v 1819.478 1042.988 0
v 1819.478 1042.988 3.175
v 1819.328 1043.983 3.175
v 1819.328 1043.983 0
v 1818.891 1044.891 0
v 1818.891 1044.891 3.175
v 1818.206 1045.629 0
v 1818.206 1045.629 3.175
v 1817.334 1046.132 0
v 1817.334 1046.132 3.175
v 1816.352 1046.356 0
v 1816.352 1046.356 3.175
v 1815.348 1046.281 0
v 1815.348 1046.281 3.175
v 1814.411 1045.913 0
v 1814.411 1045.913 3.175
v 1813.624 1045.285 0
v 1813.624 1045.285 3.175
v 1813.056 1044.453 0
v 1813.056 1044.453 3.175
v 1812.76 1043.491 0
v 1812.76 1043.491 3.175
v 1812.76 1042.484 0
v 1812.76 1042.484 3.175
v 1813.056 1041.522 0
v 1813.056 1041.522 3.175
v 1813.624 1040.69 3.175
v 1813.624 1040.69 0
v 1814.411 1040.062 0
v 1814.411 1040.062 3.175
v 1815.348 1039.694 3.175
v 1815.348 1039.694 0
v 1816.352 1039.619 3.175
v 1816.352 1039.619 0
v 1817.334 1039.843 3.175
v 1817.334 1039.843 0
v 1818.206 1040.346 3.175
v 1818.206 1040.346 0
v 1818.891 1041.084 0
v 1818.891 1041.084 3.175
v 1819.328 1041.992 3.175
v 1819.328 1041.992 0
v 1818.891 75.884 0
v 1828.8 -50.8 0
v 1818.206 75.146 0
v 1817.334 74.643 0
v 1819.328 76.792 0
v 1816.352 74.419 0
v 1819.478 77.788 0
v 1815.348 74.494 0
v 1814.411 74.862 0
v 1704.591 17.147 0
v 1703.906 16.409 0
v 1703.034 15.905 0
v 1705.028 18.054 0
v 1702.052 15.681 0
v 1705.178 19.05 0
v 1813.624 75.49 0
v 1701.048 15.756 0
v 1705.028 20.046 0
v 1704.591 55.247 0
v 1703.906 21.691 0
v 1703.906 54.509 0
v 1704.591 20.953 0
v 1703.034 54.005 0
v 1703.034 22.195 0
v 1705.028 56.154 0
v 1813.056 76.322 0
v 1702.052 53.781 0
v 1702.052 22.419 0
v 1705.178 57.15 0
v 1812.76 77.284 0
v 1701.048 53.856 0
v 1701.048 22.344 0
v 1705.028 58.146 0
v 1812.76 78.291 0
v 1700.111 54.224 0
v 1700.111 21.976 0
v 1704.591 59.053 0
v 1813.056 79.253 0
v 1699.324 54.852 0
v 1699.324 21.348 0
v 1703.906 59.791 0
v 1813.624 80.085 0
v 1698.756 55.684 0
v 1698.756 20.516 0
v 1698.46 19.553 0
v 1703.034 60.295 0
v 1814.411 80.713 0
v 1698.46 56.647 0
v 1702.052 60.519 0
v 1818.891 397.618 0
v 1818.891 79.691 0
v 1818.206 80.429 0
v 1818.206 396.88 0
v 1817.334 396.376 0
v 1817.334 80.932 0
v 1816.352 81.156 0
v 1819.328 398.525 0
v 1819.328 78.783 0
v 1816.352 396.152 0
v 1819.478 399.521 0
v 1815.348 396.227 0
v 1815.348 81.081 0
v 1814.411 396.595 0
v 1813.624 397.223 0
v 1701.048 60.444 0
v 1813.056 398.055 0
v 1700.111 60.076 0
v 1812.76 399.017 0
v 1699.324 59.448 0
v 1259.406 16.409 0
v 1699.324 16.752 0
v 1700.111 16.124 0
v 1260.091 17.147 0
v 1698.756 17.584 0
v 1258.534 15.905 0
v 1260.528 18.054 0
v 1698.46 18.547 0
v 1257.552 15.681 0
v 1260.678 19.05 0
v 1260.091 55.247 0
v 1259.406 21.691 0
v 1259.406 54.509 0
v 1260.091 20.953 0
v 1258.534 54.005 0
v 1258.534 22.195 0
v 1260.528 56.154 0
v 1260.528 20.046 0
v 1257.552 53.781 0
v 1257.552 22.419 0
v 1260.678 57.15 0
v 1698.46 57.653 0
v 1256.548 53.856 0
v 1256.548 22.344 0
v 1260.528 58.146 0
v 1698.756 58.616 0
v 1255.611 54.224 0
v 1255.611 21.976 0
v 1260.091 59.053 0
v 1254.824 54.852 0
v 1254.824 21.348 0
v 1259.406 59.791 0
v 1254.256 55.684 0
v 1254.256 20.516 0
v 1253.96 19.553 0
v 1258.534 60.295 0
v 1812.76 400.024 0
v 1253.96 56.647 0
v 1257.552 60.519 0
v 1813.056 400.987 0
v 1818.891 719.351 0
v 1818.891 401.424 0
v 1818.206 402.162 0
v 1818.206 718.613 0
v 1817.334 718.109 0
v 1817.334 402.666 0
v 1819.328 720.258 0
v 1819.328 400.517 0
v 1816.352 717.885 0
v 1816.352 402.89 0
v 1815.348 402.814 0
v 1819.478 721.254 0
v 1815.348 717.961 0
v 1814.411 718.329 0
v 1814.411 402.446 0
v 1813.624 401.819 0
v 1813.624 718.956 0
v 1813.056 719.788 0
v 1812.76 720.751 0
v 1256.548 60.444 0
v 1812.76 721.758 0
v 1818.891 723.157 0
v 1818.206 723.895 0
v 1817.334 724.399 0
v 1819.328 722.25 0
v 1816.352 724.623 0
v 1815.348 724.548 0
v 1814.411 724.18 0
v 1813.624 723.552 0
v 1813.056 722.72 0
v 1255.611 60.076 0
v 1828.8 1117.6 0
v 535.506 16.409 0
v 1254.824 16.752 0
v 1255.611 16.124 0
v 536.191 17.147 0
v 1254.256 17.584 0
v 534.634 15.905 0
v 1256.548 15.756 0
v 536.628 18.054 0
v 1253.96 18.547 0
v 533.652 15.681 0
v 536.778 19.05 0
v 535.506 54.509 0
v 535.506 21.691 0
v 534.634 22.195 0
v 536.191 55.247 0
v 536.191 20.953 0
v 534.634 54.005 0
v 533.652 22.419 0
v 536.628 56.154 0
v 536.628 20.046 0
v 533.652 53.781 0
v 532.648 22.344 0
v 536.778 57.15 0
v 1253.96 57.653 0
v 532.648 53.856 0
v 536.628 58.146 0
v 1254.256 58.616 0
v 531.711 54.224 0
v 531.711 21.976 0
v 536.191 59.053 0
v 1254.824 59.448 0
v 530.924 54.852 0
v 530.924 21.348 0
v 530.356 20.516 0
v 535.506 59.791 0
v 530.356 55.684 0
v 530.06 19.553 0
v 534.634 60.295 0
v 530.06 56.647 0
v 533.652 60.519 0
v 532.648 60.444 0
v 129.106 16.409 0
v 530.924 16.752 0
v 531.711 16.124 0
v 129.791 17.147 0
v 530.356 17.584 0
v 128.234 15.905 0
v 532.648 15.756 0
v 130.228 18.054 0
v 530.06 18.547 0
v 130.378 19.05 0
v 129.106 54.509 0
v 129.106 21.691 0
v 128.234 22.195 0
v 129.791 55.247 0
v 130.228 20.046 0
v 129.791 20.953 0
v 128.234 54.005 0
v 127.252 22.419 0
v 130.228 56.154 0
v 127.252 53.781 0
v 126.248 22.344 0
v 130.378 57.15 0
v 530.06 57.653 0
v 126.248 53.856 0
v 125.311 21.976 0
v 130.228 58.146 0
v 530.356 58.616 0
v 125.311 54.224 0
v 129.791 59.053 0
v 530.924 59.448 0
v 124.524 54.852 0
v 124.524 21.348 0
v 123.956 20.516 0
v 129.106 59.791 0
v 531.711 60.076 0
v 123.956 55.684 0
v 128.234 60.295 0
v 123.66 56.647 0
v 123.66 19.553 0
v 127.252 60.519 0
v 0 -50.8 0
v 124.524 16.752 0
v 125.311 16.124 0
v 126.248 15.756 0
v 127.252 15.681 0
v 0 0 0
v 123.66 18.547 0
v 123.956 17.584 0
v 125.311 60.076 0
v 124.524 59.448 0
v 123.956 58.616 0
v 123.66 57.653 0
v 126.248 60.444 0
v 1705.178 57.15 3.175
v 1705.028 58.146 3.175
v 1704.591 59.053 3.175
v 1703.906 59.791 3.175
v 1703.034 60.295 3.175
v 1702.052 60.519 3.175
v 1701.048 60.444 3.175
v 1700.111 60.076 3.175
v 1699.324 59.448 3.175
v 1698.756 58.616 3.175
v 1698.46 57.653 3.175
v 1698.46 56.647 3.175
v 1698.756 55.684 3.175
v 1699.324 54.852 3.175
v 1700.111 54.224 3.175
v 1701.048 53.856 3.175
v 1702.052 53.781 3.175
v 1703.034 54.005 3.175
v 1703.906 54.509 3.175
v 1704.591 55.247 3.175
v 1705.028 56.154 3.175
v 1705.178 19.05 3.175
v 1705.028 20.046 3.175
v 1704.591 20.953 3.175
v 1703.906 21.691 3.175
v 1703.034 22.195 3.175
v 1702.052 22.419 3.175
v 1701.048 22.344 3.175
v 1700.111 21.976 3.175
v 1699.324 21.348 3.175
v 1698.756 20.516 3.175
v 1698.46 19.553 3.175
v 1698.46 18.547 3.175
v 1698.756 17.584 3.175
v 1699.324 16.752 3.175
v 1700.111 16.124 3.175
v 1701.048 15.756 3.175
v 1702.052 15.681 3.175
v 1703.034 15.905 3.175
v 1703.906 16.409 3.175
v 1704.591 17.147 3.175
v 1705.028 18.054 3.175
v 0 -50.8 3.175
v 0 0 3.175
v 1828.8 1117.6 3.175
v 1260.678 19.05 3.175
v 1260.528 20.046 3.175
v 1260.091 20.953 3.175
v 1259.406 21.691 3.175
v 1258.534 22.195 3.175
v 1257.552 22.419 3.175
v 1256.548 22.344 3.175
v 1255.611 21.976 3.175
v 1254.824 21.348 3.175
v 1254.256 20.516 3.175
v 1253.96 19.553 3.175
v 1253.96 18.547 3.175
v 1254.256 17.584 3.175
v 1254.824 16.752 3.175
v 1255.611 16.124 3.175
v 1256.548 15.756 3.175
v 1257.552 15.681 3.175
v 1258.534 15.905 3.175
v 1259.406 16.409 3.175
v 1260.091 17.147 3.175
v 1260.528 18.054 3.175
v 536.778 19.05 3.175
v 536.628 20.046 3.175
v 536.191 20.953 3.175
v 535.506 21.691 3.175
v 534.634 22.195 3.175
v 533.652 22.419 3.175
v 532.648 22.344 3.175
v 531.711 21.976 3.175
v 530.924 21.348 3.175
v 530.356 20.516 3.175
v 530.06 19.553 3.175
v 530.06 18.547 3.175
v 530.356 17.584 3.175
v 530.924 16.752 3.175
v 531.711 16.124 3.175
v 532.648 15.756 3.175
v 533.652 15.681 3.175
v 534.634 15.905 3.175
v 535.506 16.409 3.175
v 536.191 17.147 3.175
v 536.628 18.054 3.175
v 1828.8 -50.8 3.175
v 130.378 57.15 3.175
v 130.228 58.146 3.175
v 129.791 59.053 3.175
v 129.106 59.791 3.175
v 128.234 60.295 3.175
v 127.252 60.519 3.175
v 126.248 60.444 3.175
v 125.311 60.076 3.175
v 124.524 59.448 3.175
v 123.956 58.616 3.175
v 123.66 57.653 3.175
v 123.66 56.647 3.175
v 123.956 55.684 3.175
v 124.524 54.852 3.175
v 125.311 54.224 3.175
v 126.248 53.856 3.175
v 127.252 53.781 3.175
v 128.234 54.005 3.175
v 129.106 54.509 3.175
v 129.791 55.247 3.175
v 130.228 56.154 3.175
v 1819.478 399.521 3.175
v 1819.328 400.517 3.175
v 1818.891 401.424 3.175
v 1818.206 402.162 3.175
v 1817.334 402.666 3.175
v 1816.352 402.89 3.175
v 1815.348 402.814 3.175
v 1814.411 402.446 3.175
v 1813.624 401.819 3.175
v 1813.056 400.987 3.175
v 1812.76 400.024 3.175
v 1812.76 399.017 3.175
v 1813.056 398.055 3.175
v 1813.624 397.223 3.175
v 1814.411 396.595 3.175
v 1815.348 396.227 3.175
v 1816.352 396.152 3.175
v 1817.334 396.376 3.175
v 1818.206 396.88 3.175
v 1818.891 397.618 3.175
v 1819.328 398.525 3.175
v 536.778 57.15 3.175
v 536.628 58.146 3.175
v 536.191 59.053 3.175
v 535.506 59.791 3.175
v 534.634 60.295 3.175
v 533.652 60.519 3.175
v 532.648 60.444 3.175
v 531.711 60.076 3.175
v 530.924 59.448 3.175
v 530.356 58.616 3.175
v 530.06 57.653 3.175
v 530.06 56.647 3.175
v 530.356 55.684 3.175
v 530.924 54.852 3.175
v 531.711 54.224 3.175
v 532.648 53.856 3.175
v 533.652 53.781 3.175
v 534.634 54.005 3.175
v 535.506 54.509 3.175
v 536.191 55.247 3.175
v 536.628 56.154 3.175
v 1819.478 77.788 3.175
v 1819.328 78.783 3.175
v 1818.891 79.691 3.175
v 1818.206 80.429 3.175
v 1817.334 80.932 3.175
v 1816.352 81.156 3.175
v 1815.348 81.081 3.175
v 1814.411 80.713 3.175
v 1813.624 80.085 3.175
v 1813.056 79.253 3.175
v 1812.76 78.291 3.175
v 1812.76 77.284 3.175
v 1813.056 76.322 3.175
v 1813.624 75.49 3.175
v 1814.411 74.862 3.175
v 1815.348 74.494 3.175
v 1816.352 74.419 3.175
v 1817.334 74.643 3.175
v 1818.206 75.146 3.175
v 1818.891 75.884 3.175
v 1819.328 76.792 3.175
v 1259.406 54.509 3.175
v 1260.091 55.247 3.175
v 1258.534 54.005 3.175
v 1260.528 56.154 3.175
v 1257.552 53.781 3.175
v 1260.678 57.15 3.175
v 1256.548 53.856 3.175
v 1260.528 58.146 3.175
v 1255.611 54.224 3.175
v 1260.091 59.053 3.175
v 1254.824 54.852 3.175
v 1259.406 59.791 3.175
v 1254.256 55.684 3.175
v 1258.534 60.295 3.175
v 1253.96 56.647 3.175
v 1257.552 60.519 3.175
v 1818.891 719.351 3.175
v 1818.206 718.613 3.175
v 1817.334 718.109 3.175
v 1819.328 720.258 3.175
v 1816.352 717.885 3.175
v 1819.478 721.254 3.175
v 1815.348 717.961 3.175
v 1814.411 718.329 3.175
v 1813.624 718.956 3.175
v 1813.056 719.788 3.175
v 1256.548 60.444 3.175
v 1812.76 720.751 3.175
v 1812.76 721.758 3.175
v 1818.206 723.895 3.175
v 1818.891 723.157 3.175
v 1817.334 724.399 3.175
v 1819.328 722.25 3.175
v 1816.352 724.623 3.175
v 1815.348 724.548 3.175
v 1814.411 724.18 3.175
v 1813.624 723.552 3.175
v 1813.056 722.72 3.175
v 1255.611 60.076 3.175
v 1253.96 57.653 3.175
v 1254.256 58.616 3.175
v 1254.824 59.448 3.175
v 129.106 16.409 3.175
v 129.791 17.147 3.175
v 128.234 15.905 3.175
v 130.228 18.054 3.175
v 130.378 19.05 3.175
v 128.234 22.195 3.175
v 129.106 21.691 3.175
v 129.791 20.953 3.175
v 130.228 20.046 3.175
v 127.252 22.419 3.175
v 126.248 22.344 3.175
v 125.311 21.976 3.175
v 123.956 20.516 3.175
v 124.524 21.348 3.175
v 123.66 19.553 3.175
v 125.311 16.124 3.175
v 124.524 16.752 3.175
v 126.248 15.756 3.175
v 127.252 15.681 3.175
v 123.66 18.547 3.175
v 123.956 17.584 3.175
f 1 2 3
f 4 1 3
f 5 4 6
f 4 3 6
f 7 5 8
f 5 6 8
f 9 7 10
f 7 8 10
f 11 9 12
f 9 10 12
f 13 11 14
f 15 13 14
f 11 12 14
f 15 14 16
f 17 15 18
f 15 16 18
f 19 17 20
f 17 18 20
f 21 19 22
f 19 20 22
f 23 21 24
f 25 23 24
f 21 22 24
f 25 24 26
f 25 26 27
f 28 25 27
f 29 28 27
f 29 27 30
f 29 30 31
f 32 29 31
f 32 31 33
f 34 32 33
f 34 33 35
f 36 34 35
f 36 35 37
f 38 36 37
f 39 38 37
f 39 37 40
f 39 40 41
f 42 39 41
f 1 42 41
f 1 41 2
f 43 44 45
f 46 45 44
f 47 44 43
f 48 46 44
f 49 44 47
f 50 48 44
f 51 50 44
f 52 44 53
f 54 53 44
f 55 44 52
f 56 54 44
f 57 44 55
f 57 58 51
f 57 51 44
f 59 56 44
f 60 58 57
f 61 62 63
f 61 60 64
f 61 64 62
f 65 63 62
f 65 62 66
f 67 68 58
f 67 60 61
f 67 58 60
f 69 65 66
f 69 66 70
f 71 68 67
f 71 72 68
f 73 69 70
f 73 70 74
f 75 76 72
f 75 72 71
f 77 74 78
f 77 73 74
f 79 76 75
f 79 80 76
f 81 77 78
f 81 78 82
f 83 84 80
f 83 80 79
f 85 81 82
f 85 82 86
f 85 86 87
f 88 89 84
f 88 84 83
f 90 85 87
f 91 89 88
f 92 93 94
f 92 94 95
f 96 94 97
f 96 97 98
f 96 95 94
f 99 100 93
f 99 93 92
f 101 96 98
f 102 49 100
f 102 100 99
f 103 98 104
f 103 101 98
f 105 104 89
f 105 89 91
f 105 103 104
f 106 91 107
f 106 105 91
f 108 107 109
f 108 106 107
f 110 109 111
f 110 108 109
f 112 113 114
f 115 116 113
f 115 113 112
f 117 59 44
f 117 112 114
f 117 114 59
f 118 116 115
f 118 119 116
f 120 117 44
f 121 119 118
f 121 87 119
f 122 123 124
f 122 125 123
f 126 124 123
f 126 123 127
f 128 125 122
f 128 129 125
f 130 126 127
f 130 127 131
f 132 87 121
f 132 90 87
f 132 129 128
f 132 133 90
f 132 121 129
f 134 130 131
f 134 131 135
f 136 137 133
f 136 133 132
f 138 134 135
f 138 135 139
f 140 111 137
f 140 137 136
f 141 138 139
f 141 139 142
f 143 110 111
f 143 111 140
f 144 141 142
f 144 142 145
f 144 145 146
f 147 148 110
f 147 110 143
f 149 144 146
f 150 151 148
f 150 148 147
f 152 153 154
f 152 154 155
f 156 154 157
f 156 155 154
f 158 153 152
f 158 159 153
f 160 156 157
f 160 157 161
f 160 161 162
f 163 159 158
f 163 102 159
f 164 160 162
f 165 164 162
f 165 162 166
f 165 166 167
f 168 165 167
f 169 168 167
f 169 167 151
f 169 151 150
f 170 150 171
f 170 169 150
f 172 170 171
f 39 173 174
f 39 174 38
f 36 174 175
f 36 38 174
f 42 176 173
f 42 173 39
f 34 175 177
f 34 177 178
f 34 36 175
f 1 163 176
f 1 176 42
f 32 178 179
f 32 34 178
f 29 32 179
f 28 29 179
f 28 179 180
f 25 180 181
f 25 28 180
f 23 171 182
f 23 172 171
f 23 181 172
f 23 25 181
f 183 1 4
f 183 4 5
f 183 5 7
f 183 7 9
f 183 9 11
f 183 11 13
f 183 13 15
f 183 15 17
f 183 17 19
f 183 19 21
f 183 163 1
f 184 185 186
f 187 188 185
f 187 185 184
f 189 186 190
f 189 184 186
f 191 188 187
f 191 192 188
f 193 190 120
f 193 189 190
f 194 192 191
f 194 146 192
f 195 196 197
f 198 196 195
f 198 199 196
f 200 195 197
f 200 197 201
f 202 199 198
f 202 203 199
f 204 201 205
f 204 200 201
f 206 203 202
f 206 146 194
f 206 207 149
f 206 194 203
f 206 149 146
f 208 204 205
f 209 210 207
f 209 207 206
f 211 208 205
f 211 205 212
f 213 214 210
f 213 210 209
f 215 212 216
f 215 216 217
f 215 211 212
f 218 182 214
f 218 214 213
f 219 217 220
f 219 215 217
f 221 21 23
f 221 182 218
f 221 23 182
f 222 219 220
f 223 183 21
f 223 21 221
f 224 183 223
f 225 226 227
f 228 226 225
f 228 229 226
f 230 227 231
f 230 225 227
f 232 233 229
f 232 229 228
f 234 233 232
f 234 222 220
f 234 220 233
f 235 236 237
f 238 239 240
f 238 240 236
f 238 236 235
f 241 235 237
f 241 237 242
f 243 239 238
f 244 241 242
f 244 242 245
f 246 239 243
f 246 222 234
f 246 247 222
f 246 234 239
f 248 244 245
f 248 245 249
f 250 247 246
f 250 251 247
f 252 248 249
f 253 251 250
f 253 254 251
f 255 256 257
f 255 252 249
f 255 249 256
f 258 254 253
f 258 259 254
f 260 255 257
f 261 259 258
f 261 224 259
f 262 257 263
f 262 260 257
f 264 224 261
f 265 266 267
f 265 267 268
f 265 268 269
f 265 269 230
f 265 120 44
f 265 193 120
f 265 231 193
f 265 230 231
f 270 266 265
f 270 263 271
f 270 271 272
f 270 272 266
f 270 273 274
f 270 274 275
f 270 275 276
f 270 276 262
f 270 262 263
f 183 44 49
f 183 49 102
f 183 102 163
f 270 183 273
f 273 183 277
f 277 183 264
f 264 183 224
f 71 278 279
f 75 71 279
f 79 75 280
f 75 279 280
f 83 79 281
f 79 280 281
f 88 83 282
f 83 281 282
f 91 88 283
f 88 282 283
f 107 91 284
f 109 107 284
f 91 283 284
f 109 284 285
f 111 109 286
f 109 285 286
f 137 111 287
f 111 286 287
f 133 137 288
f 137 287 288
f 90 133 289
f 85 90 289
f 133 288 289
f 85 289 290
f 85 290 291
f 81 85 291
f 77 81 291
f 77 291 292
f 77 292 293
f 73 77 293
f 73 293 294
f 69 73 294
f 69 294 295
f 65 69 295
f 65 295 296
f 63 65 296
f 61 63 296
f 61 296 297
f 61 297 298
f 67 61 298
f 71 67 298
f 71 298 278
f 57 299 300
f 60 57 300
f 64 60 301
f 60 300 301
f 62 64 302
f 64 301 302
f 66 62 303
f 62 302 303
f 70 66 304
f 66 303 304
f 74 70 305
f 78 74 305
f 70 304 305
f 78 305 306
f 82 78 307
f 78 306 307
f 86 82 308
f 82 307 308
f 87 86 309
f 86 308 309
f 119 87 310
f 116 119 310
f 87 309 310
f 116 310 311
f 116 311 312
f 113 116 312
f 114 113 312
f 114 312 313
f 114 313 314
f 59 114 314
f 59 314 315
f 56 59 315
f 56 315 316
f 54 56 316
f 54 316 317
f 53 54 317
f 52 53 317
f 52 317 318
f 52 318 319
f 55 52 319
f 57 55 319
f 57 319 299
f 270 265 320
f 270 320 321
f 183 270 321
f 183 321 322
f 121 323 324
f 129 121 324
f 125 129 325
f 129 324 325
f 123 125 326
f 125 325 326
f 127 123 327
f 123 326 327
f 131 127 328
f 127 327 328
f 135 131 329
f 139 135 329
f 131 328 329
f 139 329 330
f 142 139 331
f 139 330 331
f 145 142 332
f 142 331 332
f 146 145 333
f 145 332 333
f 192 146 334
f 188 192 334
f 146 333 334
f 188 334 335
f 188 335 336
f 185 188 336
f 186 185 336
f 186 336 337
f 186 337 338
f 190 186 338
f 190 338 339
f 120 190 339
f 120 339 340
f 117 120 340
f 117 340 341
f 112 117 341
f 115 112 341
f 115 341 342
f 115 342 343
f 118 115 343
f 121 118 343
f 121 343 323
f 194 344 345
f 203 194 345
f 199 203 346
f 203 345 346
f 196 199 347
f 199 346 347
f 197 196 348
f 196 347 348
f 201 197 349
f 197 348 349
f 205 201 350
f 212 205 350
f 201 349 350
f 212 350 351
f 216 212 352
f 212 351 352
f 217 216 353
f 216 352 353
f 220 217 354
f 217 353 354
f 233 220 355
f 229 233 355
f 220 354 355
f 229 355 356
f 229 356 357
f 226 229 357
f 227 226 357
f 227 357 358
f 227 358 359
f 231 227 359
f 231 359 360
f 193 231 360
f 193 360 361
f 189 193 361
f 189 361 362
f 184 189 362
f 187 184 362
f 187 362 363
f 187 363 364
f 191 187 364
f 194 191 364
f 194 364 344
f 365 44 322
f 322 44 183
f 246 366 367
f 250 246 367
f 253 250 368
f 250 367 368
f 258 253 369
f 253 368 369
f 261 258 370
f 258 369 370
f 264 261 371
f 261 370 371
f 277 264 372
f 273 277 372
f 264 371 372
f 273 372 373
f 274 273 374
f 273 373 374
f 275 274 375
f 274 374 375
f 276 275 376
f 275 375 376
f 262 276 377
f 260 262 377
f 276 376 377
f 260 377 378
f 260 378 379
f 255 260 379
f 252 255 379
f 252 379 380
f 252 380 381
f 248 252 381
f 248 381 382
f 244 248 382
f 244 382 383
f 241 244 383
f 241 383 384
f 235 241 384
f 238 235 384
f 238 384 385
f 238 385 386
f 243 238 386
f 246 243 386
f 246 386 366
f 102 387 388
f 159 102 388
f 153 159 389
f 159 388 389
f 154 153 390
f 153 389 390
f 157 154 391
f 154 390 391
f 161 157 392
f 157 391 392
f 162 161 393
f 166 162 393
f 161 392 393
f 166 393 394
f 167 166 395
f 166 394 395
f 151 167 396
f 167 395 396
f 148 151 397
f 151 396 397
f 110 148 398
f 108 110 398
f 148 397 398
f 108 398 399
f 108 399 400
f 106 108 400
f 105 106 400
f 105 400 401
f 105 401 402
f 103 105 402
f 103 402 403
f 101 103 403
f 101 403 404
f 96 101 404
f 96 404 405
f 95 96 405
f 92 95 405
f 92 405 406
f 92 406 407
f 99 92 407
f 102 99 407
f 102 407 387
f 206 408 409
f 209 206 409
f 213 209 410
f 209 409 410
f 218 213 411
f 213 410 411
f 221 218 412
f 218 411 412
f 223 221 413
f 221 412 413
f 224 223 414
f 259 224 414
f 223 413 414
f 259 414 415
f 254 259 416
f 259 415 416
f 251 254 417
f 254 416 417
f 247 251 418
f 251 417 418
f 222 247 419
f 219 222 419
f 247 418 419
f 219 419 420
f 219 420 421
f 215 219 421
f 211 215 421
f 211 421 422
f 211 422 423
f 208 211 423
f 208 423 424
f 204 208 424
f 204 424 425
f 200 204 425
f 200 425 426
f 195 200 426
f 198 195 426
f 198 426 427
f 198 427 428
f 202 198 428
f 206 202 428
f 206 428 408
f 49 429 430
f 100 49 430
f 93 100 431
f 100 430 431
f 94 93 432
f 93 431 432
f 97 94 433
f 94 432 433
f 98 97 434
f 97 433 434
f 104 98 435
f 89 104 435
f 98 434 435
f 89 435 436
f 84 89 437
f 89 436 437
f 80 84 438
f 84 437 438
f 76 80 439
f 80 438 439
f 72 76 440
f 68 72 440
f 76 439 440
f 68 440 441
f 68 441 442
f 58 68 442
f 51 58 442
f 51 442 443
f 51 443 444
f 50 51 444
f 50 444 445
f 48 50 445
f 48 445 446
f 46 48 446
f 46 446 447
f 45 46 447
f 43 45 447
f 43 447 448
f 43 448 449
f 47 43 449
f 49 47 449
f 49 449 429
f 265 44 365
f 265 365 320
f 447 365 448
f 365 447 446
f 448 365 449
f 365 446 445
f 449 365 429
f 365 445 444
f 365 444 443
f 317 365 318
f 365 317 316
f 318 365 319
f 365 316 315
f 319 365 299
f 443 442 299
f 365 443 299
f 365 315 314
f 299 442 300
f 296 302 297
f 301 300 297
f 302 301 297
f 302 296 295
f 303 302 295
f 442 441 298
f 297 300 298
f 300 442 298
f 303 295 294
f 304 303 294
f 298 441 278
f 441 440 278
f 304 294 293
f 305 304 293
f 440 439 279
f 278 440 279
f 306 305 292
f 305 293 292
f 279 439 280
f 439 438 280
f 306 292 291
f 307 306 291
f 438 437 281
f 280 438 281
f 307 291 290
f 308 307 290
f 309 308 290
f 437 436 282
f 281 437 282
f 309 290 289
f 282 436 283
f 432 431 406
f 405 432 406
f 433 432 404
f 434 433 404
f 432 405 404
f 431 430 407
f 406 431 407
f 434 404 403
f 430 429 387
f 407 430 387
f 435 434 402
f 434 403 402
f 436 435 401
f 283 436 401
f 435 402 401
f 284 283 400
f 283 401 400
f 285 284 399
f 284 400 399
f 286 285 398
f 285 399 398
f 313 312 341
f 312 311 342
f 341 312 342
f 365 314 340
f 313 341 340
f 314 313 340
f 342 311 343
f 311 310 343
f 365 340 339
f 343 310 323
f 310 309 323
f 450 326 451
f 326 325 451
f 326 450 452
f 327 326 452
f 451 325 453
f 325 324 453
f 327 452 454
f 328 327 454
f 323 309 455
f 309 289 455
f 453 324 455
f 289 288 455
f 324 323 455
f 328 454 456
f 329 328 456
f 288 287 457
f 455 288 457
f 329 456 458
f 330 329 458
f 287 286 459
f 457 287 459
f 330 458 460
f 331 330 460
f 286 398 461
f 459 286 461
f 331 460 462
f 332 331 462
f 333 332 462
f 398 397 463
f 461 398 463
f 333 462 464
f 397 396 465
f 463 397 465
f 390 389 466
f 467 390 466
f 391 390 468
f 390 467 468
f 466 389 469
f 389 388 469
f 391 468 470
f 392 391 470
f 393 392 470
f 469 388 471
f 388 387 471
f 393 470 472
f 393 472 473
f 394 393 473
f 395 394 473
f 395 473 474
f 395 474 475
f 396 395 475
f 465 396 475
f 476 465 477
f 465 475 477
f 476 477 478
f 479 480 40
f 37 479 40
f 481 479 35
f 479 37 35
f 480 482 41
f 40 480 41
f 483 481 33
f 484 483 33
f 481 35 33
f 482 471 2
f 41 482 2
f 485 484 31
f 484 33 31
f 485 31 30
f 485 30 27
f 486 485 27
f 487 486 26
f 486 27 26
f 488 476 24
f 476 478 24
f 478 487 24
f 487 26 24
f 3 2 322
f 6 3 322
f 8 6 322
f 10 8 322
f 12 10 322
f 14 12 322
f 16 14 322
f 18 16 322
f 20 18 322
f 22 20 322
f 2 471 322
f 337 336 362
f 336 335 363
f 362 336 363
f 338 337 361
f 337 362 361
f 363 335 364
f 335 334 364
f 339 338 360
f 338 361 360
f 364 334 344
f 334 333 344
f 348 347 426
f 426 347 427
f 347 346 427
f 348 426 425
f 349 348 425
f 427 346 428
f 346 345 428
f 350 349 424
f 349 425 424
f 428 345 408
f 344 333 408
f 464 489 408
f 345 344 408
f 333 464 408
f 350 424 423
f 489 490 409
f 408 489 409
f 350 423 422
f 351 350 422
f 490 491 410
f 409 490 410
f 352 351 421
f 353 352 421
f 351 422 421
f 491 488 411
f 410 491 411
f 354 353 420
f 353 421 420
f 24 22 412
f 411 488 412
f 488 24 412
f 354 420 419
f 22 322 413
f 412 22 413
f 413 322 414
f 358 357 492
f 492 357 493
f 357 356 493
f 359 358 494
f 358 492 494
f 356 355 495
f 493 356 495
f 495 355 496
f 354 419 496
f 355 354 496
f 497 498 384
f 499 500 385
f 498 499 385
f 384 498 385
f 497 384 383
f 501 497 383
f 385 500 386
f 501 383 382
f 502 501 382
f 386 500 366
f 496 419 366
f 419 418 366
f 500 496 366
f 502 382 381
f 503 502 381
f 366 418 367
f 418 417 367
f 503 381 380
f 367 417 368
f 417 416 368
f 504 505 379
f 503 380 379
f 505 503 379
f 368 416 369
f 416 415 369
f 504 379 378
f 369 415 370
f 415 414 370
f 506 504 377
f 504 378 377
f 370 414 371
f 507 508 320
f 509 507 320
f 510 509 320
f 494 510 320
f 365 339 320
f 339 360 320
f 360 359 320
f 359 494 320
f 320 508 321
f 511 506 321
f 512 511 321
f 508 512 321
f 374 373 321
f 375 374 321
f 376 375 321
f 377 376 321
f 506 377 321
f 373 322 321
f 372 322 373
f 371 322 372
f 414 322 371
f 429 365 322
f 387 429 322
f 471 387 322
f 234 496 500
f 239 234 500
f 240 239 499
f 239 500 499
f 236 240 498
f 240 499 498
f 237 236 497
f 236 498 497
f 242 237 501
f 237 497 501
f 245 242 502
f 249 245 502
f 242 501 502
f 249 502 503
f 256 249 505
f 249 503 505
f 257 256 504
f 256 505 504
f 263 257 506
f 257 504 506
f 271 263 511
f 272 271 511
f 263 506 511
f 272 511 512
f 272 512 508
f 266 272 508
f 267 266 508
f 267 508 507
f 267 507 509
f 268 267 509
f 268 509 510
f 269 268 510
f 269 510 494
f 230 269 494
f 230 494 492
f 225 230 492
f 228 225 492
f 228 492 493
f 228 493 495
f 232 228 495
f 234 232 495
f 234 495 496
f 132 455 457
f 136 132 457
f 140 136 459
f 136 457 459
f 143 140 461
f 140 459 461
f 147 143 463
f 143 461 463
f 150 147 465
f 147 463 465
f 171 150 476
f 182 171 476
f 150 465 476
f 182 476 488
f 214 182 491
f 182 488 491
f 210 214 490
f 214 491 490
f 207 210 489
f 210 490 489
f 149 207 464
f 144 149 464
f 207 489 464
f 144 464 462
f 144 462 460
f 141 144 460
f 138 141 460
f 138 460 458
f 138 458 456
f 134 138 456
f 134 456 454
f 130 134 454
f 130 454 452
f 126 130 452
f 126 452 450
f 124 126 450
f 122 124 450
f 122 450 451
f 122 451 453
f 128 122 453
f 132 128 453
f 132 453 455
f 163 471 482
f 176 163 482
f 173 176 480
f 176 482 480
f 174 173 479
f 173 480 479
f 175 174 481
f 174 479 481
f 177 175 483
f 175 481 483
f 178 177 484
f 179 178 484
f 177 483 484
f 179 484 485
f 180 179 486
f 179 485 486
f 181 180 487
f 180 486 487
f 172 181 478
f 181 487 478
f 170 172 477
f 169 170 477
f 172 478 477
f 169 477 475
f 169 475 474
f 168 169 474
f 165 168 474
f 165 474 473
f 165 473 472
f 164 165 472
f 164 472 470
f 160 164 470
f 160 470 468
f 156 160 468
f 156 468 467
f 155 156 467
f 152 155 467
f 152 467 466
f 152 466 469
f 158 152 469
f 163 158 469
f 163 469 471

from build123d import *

# Parameters (mm, degrees)
BOSS_EXTRUDE1_DEPTH     = 3.175
F_1_4_CLEARANCE_HOLE1_D = 6.7564
SKETCH7_W               = 1828.8
SKETCH7_H               = 50.8
BOSS_EXTRUDE3_DEPTH     = 3.175


with BuildPart() as part:
    # Sketch1 → Boss-Extrude1 (new body)
    with BuildSketch(Plane.XY):
        Polygon((0, 0), (1828.8, 1117.6), (1828.8, 0), align=None)
    extrude(amount=BOSS_EXTRUDE1_DEPTH)

    # 1/4 Clearance Hole1 (through all)
    with Locations(Plane(origin=(0, 0, 0), x_dir=(-1, 0, 0), z_dir=(0, 0, -1))):
        with Locations((-1816.1, 77.7875), (-1816.1, 399.520833333), (-1816.1, 721.254166667), (-1816.1, 1042.9875), (-1701.8, 19.05), (-1701.8, 57.15), (-1257.3, 57.15), (-1257.3, 19.05), (-533.4, 57.15), (-533.4, 19.05), (-127, 57.15), (-127, 19.05)):
            Hole(F_1_4_CLEARANCE_HOLE1_D / 2)

    # Sketch7 → Boss-Extrude3 (add)
    with BuildSketch(Plane(origin=(0, 0, 0), x_dir=(-1, 0, 0), z_dir=(0, 0, -1))):
        with Locations((-914.4, -25.4)):
            Rectangle(SKETCH7_W, SKETCH7_H)
    extrude(amount=-BOSS_EXTRUDE3_DEPTH)


solid = part.part
